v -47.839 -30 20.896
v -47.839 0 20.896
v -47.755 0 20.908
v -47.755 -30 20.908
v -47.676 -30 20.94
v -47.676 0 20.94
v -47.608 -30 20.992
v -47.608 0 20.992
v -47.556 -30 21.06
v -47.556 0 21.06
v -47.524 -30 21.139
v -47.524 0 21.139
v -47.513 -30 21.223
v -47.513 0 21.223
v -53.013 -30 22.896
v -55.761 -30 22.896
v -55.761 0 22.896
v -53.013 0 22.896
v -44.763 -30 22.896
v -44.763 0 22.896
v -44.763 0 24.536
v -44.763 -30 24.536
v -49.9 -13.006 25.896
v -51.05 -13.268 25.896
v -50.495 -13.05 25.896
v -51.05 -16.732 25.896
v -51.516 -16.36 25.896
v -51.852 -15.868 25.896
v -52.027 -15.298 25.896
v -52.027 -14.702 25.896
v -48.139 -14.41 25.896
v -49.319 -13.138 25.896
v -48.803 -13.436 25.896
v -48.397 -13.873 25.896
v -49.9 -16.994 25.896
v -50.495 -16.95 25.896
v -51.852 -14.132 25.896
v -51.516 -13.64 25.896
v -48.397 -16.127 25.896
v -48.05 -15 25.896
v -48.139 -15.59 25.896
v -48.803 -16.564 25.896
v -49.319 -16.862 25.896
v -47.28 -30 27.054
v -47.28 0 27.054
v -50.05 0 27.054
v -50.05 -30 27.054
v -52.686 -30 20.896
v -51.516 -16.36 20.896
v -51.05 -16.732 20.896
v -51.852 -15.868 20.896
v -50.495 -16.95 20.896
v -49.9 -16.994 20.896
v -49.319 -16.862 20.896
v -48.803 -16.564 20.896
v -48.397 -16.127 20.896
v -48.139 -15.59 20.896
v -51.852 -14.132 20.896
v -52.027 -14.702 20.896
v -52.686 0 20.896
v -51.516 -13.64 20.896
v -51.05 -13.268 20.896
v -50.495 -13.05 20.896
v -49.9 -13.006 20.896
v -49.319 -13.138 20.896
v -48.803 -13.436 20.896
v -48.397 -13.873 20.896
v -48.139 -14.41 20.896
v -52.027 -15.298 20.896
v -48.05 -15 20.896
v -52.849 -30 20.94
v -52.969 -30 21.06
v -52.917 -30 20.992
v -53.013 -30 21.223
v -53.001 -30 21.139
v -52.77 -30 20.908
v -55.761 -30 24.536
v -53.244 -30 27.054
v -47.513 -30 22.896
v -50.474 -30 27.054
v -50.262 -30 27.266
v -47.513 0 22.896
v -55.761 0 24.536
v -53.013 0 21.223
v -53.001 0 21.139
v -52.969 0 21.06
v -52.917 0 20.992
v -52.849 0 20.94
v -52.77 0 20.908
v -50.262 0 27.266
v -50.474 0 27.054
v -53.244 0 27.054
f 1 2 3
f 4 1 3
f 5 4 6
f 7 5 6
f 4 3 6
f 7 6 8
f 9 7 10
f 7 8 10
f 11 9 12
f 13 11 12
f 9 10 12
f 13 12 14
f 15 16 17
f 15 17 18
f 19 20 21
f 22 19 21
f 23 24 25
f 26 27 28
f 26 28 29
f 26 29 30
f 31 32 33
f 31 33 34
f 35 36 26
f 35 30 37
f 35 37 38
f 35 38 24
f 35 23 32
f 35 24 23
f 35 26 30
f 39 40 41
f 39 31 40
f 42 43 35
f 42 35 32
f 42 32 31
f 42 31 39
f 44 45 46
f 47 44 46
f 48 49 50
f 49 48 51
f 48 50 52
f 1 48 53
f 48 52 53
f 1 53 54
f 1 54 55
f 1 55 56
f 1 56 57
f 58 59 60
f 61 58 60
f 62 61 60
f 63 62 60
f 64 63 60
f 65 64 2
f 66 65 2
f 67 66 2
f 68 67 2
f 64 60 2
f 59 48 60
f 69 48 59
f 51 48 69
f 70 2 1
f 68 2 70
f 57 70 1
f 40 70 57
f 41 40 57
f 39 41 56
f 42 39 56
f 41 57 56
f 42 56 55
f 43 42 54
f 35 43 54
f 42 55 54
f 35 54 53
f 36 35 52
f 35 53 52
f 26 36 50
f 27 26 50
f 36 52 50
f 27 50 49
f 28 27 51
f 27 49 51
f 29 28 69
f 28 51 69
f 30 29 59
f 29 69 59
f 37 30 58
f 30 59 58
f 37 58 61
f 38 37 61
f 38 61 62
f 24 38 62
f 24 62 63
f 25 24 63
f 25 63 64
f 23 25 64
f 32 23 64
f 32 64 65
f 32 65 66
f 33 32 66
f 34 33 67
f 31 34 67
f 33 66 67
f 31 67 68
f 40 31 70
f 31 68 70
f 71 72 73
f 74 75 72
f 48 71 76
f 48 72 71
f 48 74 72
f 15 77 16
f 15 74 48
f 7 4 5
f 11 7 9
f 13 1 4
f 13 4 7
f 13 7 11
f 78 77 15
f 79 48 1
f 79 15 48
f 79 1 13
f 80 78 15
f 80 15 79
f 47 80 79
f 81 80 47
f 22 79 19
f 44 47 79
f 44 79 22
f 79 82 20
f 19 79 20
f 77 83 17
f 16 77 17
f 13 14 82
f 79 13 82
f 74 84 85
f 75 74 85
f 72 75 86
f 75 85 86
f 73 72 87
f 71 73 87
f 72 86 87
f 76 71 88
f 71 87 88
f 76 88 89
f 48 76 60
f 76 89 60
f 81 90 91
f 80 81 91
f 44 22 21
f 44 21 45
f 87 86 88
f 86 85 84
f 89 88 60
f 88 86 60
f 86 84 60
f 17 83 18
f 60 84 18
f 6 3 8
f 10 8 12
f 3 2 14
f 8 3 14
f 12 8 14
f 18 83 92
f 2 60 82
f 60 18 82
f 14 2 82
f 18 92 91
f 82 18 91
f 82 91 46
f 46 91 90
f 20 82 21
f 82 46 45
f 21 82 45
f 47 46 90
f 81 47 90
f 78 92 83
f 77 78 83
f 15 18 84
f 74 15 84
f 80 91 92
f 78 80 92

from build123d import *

# Parameters (mm, degrees)
F1_DEPTH = 30
F2_R     = 2
F3_DEPTH = 5


with BuildPart() as f1:
    # F0 (on Front) → F1 (new body)
    with BuildSketch(Plane.XZ):
        with BuildLine():
            Line((-50.474065, 27.053742), (-53.244065, 27.053742))
            Line((-53.244065, 27.053742), (-55.761366, 24.536442))
            Line((-55.761366, 24.536442), (-55.761366, 22.896442))
            Line((-55.761366, 22.896442), (-53.012501, 22.896442))
            Line((-53.012501, 22.896442), (-53.012501, 21.223109))
            ThreePointArc((-53.012501, 21.223109), (-52.916823, 20.99212), (-52.685834, 20.896442))
            Line((-52.685834, 20.896442), (-47.839168, 20.896442))
            ThreePointArc((-47.839168, 20.896442), (-47.60818, 20.99212), (-47.512501, 21.223109))
            Line((-47.512501, 21.223109), (-47.512501, 22.896442))
            Line((-47.512501, 22.896442), (-44.762501, 22.896442))
            Line((-44.762501, 22.896442), (-44.762501, 24.536442))
            Line((-44.762501, 24.536442), (-47.279801, 27.053742))
            Line((-47.279801, 27.053742), (-50.049801, 27.053742))
            Line((-50.049801, 27.053742), (-50.261933, 27.265874))
            Line((-50.261933, 27.265874), (-50.474065, 27.053742))
        make_face()
    extrude(amount=F1_DEPTH)

    # F2 (on face) → F3 (cut)
    with BuildSketch(Plane(origin=(0, 0, 20.896442), x_dir=(1, 0, 0), z_dir=(0, 0, -1))):
        with Locations((-50.049801, 15)):
            Circle(F2_R)
    extrude(amount=-F3_DEPTH, mode=Mode.SUBTRACT)


solid = f1.part
